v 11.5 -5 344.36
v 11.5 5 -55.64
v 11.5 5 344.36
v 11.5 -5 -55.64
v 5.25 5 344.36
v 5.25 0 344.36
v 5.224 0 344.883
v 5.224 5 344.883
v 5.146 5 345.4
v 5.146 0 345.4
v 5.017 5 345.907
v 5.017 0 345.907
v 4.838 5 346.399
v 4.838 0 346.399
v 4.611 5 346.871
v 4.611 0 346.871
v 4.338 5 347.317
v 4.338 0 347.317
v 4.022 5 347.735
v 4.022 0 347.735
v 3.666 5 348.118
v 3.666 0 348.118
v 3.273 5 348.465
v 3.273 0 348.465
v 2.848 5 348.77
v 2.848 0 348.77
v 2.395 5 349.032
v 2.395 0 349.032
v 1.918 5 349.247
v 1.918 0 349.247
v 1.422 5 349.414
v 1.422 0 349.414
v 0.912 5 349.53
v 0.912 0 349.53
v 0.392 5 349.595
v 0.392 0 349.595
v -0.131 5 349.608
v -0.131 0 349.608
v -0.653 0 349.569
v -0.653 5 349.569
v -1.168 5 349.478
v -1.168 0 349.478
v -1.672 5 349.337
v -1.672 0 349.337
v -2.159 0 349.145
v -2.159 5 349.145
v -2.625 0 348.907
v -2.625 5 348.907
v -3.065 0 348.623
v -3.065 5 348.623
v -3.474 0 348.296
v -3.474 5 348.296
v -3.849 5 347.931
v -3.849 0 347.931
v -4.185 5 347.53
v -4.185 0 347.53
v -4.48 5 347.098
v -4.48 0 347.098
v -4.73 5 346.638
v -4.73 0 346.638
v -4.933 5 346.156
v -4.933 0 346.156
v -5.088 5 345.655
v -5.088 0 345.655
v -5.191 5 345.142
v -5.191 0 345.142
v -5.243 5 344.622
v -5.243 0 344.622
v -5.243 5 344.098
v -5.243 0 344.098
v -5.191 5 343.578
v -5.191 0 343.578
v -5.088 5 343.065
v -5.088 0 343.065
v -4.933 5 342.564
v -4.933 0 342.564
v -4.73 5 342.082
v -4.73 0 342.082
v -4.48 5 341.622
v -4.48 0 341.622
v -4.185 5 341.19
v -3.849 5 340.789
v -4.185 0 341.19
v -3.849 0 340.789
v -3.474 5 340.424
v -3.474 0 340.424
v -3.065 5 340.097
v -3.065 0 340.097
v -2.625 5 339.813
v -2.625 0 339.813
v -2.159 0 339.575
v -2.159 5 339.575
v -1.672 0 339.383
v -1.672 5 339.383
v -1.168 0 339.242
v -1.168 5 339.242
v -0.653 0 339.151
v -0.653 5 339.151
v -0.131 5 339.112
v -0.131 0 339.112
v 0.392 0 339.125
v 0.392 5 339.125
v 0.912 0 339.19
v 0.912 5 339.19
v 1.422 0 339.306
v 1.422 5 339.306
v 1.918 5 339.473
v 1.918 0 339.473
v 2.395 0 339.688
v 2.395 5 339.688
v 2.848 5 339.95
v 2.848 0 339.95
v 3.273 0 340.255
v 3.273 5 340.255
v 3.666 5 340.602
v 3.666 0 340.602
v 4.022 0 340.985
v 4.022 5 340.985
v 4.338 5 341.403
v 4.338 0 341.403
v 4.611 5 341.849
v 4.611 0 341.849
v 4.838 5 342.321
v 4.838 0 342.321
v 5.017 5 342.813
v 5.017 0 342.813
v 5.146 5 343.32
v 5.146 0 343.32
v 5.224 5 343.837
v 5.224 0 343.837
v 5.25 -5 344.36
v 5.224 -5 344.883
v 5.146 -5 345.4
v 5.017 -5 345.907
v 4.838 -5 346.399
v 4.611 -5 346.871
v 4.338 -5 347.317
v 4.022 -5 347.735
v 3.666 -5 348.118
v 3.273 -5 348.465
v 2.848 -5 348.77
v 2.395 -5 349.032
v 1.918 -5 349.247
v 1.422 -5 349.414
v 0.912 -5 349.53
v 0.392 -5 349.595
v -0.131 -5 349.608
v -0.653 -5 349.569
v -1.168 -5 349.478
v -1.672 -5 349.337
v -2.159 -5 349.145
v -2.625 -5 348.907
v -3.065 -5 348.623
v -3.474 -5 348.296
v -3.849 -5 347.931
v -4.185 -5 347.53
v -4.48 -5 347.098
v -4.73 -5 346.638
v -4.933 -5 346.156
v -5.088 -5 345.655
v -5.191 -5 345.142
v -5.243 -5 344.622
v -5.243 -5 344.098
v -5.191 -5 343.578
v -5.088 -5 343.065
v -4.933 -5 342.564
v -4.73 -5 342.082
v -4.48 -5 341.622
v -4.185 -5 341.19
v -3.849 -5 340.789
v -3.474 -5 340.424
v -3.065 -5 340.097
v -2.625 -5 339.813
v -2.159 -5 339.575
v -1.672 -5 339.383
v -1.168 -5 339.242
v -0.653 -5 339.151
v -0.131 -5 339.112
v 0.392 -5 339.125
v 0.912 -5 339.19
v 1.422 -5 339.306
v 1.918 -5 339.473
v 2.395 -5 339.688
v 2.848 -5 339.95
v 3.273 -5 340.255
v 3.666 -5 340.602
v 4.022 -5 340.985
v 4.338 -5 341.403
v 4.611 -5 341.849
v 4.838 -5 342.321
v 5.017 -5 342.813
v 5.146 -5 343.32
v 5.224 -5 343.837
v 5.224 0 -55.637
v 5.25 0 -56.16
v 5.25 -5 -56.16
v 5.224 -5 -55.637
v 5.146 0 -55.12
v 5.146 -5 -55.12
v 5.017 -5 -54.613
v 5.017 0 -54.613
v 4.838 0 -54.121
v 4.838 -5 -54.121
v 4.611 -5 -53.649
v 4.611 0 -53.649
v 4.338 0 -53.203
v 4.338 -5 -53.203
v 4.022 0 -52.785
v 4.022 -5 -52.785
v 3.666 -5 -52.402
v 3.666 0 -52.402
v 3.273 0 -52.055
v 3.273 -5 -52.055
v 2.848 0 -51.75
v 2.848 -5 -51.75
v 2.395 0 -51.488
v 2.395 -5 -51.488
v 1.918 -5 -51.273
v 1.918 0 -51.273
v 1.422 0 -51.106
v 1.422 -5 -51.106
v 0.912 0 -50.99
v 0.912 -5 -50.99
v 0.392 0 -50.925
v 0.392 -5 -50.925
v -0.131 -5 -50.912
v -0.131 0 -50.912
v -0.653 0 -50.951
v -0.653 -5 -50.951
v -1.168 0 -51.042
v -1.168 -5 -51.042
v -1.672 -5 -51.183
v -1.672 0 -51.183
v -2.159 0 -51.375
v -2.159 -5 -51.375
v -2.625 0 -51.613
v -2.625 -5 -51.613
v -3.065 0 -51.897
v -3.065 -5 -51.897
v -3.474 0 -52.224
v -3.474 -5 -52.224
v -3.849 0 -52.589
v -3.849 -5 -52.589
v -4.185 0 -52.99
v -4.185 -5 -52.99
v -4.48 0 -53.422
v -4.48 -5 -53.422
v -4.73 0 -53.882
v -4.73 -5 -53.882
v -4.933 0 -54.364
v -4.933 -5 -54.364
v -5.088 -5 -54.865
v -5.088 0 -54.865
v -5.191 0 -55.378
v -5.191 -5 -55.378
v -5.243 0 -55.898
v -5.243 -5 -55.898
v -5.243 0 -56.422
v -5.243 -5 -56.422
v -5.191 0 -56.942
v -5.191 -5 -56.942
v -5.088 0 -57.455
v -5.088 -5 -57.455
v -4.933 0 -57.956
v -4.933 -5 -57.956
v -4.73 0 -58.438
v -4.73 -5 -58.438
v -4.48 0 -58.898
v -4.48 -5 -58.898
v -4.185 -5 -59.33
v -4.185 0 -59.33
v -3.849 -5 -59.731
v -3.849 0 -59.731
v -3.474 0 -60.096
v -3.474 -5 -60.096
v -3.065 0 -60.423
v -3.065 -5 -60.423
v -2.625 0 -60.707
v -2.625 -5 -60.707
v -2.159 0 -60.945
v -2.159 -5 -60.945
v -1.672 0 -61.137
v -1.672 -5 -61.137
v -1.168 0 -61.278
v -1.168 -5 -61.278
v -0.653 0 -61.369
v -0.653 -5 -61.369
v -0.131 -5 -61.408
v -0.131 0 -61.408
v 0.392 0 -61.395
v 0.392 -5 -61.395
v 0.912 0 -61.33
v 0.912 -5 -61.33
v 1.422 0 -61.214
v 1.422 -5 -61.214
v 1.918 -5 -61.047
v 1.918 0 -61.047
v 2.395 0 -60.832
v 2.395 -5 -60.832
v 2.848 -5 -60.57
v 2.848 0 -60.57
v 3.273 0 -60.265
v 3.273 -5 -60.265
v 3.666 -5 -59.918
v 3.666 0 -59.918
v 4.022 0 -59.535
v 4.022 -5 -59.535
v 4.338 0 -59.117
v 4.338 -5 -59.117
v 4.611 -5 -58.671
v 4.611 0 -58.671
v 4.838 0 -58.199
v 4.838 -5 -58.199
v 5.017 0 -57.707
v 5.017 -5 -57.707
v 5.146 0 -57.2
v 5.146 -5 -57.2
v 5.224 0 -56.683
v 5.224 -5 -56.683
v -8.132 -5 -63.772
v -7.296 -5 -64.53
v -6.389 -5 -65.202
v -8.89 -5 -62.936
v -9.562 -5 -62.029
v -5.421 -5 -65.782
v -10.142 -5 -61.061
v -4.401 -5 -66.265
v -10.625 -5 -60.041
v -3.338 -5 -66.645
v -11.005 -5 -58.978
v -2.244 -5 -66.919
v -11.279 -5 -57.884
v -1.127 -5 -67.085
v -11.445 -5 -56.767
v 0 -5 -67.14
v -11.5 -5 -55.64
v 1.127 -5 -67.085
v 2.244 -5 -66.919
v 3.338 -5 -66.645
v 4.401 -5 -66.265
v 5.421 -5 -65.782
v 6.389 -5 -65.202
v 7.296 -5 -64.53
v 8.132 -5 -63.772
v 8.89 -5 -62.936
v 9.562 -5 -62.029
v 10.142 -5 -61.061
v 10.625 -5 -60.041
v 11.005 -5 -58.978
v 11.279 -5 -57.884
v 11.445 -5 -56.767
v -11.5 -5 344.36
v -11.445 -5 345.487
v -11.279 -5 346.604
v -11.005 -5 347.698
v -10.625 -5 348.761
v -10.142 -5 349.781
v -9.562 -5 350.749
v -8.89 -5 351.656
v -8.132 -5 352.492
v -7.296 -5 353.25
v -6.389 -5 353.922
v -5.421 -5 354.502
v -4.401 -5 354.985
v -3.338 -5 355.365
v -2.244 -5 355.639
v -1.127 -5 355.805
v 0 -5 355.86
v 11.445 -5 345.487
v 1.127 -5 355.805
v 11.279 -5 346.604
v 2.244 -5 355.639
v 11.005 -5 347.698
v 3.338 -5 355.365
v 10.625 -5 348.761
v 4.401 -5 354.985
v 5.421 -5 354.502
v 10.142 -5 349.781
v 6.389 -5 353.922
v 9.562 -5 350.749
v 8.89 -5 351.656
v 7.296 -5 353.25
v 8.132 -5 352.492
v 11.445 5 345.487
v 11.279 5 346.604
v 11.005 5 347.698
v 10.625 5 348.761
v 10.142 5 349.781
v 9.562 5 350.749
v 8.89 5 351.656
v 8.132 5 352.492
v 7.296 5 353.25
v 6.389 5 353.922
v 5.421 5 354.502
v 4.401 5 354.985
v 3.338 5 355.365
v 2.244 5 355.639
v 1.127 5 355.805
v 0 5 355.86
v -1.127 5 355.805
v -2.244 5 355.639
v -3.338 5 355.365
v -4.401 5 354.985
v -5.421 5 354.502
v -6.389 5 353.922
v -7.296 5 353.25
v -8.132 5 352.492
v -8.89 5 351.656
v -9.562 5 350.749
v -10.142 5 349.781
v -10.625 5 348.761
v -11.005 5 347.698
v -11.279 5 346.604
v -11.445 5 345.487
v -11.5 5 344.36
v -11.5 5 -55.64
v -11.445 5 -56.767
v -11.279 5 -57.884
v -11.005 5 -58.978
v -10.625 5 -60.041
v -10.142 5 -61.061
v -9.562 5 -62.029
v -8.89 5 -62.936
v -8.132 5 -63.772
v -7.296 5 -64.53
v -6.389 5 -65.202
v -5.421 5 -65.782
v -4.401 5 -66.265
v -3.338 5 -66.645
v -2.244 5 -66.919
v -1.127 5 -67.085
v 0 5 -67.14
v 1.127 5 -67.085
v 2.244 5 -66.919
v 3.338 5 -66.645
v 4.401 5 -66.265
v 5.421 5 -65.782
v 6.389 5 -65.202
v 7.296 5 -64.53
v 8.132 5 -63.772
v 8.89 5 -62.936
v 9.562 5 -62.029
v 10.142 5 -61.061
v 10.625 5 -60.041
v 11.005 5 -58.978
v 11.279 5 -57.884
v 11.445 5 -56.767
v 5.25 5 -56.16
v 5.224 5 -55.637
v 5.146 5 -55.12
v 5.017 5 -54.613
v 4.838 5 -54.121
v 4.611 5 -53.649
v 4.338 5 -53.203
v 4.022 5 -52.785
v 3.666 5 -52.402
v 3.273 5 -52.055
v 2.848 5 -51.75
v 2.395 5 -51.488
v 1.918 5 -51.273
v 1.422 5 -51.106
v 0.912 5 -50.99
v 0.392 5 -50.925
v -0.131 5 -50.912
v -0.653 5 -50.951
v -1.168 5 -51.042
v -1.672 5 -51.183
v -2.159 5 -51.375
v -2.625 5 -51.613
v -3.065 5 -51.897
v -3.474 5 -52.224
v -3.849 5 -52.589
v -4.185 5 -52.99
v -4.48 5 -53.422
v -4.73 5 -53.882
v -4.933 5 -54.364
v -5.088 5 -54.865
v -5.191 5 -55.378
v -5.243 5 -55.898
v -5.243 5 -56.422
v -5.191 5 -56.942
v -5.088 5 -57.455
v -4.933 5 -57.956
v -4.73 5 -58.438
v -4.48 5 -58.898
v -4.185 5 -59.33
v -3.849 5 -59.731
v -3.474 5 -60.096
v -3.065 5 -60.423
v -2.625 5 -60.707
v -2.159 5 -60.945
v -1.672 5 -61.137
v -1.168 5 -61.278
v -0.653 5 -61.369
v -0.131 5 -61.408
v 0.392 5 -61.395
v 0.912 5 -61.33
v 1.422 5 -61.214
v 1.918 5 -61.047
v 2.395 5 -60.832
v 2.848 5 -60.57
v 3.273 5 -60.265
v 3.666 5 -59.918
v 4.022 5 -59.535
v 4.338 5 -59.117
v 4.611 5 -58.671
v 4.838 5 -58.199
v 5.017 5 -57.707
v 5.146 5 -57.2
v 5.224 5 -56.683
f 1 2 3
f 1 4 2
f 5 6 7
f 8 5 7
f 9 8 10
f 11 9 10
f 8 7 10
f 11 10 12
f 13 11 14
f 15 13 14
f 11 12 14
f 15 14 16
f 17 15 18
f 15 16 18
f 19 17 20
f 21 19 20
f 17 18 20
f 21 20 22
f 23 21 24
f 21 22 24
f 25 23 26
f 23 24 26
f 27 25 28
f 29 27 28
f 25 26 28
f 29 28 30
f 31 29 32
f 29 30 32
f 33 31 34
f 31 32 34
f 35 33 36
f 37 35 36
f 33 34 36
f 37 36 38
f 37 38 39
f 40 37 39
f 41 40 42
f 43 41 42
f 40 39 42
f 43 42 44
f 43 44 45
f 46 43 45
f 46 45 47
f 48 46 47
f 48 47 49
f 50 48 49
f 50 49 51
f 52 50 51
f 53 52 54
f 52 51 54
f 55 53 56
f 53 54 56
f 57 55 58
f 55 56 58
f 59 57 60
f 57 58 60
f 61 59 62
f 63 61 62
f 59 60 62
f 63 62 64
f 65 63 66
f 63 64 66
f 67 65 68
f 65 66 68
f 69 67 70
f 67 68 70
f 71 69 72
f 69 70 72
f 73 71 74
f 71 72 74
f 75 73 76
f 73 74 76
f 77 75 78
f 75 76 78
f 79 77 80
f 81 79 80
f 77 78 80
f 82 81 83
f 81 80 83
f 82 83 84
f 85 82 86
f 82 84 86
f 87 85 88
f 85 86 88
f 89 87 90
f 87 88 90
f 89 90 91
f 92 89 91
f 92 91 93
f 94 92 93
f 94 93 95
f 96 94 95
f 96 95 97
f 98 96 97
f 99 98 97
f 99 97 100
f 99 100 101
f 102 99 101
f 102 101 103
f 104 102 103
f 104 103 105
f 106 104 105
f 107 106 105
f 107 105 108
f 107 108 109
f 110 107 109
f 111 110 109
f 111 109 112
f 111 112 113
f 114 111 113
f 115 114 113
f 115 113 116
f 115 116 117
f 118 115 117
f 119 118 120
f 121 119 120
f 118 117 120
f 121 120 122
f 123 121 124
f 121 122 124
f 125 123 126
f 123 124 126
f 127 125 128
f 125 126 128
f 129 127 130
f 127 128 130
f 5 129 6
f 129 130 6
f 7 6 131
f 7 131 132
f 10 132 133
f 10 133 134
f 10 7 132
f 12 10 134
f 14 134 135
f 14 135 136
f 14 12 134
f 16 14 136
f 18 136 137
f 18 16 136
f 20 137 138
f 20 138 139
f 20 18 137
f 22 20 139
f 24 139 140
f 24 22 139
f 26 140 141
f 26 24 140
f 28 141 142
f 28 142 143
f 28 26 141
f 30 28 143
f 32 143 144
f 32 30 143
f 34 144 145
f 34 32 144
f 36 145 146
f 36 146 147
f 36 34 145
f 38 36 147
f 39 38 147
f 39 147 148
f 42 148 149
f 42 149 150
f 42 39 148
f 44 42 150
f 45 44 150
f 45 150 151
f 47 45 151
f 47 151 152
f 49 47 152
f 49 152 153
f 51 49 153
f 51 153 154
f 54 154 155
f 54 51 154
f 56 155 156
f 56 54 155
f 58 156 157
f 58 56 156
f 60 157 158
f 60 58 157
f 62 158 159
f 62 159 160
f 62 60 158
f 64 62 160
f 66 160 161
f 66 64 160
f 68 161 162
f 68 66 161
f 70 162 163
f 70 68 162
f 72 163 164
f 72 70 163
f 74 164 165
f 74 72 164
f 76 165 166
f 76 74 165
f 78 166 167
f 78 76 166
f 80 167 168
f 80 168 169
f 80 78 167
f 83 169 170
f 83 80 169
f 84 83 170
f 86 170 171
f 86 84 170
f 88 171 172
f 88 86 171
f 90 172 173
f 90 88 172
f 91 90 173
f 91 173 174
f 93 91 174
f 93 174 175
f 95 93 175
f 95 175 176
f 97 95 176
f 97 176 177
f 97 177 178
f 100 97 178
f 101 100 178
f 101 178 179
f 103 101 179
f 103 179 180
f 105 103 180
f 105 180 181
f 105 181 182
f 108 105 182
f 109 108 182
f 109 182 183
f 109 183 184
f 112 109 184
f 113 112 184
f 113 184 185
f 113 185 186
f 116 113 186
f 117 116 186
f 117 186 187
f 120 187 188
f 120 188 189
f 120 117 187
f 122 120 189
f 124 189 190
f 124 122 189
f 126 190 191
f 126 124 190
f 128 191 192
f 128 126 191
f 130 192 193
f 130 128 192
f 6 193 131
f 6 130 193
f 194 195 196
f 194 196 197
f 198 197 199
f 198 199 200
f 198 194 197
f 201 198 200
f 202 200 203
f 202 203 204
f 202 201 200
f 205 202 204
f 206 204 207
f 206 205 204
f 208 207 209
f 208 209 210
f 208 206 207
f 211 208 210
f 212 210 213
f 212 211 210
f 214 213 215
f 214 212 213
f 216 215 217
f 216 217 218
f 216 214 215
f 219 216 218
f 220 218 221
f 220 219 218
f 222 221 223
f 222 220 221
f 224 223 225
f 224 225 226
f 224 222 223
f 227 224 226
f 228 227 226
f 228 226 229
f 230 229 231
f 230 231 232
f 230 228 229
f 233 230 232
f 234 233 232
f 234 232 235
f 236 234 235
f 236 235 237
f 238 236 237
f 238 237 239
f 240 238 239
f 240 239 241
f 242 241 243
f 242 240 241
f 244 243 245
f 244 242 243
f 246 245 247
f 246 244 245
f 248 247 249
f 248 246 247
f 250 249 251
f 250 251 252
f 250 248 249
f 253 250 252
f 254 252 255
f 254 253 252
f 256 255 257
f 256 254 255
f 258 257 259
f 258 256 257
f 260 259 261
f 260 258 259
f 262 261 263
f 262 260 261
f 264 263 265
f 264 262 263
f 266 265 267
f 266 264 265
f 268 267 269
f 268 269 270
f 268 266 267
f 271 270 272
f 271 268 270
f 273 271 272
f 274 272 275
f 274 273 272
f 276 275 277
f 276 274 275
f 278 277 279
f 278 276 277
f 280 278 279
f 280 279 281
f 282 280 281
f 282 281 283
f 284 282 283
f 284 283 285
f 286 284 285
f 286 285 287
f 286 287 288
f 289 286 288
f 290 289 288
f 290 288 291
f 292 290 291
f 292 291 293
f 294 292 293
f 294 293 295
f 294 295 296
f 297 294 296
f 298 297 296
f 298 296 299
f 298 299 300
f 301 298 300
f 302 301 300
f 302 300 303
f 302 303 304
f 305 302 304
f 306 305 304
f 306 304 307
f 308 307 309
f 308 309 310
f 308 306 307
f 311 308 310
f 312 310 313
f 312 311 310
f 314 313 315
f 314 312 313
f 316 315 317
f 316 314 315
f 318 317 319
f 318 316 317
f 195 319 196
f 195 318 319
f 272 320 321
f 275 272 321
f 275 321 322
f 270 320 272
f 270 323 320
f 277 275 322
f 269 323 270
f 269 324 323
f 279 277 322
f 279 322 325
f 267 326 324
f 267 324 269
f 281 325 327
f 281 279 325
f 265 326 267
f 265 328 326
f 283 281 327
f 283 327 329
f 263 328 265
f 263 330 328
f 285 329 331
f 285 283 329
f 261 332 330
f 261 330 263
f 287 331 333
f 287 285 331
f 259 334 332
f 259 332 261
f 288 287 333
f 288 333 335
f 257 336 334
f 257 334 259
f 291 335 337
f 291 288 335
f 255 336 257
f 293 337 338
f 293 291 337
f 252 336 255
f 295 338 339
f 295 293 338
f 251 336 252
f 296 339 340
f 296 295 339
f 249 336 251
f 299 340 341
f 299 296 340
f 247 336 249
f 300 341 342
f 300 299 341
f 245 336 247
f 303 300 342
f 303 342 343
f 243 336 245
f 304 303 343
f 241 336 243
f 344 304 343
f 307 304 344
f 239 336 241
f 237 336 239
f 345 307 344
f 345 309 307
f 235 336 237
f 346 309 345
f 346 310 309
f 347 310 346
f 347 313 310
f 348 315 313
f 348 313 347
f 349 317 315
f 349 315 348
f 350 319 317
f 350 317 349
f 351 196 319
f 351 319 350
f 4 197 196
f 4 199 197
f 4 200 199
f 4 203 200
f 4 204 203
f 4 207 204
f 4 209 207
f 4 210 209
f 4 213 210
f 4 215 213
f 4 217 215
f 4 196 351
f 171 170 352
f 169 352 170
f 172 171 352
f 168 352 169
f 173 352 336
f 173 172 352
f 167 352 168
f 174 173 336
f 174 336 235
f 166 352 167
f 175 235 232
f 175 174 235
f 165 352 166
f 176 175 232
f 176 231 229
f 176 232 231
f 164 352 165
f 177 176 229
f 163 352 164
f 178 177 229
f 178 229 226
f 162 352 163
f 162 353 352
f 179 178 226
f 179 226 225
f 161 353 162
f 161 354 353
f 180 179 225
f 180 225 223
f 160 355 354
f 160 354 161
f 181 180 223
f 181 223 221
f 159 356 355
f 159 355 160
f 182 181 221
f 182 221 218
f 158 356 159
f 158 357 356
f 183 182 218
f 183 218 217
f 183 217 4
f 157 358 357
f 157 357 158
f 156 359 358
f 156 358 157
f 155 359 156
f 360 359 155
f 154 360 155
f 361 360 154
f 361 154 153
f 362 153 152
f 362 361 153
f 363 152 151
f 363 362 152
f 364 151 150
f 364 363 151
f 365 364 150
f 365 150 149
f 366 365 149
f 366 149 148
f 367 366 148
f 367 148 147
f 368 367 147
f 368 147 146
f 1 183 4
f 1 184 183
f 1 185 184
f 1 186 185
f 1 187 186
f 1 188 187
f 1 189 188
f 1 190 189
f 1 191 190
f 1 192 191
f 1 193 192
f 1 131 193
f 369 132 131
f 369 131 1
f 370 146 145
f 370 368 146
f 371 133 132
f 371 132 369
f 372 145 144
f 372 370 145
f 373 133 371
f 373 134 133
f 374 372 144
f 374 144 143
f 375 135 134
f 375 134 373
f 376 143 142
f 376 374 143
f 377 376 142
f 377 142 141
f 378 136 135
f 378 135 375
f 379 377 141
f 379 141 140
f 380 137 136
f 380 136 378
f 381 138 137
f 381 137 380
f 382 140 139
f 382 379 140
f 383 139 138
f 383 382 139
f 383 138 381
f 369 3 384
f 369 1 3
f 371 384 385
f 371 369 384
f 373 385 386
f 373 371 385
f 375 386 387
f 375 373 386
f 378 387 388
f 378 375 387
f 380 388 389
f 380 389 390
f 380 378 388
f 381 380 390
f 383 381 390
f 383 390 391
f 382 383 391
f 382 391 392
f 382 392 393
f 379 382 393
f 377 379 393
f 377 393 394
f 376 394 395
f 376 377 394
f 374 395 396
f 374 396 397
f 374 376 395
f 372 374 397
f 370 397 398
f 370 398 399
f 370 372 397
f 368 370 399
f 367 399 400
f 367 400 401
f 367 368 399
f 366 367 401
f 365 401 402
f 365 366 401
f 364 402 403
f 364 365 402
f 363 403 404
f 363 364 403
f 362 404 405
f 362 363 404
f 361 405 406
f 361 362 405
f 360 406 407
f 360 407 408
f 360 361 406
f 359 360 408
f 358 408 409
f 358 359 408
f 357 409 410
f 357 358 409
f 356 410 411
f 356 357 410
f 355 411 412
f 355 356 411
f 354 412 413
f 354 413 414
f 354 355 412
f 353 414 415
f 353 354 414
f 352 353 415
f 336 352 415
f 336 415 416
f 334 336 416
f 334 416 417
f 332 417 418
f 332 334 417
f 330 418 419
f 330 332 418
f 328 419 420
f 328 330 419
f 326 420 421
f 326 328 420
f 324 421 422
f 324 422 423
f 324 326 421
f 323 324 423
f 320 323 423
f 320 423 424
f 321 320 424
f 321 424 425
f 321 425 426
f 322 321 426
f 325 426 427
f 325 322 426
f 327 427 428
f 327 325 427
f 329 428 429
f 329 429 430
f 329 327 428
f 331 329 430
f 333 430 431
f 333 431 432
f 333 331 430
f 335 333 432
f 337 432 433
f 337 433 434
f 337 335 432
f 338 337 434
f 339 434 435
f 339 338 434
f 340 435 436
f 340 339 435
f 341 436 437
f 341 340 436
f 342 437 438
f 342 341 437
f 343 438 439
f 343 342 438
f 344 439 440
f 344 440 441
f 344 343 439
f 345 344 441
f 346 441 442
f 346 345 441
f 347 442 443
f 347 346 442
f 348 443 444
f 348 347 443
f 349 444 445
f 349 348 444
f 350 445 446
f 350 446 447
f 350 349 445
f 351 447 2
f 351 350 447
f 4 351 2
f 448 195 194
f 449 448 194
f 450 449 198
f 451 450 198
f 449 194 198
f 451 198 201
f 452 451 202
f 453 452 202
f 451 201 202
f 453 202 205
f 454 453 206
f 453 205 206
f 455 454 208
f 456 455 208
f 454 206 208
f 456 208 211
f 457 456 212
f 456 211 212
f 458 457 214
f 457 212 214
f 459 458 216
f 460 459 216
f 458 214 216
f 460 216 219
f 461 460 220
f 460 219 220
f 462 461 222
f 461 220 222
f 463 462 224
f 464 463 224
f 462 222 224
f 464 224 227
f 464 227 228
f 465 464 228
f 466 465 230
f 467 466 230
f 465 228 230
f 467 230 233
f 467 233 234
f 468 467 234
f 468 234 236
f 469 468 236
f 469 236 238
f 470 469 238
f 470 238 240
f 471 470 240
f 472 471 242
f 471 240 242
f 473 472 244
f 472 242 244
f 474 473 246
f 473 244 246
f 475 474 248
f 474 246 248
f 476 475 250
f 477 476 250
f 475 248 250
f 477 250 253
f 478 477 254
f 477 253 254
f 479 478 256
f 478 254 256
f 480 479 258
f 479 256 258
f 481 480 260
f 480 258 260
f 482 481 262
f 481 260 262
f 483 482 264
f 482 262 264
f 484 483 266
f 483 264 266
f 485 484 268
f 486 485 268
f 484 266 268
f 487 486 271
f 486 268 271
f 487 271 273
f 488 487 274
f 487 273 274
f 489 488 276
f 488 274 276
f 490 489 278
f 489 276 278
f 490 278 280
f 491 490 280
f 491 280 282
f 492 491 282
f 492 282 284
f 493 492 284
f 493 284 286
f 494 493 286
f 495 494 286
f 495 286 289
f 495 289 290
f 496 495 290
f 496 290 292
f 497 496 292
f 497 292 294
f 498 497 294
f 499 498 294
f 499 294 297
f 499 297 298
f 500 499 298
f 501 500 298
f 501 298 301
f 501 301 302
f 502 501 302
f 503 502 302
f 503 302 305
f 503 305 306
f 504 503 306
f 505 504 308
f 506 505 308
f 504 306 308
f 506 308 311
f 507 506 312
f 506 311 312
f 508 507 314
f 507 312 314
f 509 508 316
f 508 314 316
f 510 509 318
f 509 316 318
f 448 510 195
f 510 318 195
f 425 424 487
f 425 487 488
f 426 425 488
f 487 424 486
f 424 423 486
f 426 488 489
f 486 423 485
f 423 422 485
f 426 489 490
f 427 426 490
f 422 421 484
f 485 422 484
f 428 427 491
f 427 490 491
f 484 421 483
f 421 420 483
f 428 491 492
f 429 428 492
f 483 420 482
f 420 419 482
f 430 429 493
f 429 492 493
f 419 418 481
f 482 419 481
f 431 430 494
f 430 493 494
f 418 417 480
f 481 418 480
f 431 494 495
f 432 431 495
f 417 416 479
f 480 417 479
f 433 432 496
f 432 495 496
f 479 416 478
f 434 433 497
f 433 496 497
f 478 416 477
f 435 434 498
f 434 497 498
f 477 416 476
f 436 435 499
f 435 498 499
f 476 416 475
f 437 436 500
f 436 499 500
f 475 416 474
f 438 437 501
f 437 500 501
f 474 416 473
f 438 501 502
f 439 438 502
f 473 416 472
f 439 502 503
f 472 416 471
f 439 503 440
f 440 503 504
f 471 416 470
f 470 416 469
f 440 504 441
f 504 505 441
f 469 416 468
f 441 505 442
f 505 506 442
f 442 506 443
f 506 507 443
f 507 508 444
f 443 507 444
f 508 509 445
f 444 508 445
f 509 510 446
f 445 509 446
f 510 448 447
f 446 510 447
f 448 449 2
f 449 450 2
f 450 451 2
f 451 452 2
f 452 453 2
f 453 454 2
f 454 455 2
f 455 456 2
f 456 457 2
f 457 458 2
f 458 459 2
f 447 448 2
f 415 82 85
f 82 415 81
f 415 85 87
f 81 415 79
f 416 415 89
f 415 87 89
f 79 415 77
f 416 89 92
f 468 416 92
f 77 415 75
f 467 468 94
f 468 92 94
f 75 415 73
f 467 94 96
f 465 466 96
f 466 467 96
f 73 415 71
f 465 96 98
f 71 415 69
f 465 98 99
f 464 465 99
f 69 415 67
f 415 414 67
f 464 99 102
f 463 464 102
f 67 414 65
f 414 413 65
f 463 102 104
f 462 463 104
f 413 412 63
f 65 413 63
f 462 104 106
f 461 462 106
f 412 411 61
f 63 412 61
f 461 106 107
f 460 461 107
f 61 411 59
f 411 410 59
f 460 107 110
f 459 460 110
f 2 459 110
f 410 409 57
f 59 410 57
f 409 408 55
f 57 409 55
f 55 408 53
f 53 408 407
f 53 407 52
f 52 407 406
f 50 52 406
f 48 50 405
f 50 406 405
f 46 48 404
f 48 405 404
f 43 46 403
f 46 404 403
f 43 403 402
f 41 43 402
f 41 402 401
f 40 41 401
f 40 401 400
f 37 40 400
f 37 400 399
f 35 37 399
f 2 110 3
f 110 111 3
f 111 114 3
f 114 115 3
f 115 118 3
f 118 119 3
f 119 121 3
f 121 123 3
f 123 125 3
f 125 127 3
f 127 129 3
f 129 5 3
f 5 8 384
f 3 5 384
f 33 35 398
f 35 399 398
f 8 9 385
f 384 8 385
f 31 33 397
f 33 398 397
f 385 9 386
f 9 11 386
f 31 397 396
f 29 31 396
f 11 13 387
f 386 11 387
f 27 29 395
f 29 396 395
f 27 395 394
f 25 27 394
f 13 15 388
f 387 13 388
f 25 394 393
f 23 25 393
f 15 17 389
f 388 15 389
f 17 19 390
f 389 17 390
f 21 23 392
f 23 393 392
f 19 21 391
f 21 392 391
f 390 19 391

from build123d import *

# Parameters (mm, degrees)
F0_R          = 5.25
F1_DEPTH      = 5
F1_DEPTH_BACK = 5


with BuildPart() as f1:
    # F0 (on Front) → F1 (new body, two sides)
    with BuildSketch(Plane.XZ) as f1_sk:
        with BuildLine():
            ThreePointArc((11.5, 344.359994), (0, 355.859994), (-11.5, 344.359994))
            Line((-11.5, 344.359994), (-11.5, -55.640006))
            ThreePointArc((-11.5, -55.640006), (0, -67.140006), (11.5, -55.640006))
            Line((11.5, -55.640006), (11.5, 344.359994))
        make_face()
        with Locations((0, -56.160006)):
            Circle(F0_R, mode=Mode.SUBTRACT)
        with Locations((0, 344.359994)):
            Circle(F0_R, mode=Mode.SUBTRACT)
    extrude(amount=F1_DEPTH)
    extrude(f1_sk.sketch, amount=-F1_DEPTH_BACK)


solid = f1.part
